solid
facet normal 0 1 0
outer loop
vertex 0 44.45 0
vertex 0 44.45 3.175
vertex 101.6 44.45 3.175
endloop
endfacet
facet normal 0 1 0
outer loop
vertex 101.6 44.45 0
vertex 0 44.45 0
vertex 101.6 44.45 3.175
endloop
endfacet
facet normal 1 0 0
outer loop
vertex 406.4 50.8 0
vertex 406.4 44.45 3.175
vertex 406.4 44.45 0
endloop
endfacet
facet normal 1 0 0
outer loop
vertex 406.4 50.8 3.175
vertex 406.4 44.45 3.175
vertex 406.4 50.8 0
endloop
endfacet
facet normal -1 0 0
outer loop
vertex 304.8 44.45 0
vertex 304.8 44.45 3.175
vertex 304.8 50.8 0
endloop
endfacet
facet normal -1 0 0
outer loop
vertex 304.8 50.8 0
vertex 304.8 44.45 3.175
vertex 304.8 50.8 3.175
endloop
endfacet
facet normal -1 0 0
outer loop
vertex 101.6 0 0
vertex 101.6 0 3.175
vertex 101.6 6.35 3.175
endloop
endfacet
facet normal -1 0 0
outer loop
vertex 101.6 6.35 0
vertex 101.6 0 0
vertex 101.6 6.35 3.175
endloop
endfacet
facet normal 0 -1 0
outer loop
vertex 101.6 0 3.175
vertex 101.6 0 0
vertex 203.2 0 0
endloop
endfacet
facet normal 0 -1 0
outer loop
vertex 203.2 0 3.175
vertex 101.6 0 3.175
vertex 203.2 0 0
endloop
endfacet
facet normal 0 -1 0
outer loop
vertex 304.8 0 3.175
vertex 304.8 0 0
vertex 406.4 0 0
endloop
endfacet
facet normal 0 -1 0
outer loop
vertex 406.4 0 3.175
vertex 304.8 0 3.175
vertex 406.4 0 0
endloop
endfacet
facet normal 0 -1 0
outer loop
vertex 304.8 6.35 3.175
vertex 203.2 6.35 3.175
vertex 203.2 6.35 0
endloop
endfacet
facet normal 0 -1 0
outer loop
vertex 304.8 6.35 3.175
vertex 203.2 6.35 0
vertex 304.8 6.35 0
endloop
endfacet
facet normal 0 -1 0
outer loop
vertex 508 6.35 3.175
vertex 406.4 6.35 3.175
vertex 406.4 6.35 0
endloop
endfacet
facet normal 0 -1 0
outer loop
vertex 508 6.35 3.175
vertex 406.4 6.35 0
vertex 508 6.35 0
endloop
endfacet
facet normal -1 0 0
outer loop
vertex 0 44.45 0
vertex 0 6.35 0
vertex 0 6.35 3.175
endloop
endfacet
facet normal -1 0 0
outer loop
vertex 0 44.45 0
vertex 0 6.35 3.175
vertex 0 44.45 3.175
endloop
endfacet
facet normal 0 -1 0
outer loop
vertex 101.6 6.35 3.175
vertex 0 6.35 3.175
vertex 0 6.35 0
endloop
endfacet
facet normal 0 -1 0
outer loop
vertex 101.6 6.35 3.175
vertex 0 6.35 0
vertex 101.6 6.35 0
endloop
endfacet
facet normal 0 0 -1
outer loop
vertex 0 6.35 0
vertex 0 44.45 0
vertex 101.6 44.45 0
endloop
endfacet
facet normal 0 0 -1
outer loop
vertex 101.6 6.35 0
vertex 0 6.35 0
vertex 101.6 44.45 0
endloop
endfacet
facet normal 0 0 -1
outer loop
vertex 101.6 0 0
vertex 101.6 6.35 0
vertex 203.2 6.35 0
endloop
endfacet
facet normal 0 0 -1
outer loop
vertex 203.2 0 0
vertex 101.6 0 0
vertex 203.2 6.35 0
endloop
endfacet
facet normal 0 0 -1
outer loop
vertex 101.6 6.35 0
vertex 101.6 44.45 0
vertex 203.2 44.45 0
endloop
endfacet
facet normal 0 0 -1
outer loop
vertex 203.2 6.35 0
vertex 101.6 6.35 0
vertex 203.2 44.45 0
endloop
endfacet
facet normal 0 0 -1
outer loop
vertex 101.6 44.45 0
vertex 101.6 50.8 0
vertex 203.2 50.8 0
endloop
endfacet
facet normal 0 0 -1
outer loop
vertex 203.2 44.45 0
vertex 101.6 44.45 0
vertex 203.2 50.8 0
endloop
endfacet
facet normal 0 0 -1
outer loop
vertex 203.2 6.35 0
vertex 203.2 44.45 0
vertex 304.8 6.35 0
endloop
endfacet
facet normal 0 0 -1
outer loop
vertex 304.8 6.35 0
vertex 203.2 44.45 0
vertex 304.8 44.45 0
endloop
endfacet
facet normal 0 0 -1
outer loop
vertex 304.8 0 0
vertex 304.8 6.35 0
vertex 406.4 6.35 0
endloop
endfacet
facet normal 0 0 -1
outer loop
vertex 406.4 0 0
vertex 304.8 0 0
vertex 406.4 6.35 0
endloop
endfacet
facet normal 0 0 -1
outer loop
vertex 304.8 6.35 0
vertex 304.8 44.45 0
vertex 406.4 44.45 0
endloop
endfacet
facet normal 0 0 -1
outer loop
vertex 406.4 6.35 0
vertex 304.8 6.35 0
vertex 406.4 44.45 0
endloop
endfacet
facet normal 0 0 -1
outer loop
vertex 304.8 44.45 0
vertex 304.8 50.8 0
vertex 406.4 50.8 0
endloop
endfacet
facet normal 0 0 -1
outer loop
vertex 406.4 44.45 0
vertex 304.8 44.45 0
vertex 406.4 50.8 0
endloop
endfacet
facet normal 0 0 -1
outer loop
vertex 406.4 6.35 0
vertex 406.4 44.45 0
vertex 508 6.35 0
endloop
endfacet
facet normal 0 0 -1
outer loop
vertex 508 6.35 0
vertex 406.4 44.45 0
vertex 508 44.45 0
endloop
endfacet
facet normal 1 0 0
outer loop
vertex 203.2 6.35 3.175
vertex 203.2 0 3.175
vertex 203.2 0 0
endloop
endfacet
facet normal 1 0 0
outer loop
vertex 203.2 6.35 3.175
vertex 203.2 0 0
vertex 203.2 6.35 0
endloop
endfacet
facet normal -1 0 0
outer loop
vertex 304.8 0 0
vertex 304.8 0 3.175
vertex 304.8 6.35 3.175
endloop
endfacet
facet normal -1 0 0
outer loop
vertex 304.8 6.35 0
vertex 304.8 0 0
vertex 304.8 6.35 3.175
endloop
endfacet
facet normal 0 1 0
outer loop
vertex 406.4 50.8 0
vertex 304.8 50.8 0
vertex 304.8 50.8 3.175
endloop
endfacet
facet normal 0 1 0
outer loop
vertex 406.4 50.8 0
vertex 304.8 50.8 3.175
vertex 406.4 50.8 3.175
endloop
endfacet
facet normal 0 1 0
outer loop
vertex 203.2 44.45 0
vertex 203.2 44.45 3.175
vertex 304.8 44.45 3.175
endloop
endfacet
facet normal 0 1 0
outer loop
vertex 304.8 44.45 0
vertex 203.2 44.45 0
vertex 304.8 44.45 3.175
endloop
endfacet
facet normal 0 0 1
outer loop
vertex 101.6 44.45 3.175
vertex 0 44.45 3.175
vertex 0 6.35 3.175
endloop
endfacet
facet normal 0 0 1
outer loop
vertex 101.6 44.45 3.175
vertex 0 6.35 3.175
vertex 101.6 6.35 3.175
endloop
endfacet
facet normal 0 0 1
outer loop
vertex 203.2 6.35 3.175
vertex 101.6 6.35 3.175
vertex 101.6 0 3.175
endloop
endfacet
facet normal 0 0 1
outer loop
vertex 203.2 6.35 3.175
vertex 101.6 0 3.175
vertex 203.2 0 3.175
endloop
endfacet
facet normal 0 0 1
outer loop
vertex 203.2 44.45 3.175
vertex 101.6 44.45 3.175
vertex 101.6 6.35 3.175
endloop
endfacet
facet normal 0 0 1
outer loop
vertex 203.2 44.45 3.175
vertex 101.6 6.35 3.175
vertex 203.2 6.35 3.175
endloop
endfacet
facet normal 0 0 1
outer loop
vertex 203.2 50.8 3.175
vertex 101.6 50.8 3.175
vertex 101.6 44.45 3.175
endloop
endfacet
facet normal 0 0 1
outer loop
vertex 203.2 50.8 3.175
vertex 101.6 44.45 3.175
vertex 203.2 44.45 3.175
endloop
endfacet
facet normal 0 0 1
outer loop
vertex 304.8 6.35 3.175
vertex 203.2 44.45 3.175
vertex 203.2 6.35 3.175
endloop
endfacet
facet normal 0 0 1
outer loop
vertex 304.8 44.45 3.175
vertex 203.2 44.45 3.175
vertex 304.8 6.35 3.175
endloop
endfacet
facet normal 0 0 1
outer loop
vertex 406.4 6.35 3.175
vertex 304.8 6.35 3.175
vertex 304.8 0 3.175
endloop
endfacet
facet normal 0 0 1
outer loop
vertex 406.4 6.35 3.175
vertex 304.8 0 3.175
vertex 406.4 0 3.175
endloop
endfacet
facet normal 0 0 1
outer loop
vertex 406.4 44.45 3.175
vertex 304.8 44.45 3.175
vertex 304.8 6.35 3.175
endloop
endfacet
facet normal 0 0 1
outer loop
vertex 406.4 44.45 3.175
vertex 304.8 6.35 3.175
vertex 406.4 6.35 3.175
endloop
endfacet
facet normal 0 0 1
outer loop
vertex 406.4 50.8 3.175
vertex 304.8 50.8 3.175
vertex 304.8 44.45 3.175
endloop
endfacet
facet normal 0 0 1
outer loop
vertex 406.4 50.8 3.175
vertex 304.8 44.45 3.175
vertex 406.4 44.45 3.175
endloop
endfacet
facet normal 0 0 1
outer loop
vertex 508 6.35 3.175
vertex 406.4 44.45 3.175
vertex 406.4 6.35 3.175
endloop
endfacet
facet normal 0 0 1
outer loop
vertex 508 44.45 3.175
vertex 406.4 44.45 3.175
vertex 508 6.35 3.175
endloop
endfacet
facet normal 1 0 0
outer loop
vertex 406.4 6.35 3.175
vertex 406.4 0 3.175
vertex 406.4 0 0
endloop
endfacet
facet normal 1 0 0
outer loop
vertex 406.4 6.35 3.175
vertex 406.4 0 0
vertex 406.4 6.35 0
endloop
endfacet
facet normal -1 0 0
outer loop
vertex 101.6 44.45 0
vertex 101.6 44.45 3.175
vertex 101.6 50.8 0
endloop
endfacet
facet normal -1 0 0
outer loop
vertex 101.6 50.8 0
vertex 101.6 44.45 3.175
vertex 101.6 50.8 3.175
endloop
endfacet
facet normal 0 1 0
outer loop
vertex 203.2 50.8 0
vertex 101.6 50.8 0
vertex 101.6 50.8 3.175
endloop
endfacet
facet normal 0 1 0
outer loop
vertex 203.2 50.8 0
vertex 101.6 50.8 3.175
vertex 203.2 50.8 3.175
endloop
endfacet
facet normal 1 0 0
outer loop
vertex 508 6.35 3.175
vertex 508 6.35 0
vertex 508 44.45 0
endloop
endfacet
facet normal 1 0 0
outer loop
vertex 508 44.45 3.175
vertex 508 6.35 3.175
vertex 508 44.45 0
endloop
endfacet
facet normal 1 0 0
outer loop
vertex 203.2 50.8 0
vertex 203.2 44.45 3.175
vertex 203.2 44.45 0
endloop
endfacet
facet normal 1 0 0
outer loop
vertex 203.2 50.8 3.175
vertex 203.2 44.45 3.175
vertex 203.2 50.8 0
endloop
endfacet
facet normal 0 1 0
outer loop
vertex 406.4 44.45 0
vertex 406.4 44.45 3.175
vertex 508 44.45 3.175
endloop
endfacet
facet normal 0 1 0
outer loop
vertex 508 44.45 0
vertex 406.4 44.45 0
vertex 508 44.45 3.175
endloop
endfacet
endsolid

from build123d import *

# Parameters (mm, degrees)
F0_W     = 508
F0_H     = 50.8
F1_DEPTH = 3.175
F2_W     = 101.6
F2_H     = 6.35
F3_DEPTH = 25.4
F4_W     = 101.6
F4_H     = 6.35
F5_DEPTH = 25.4


with BuildPart() as f1:
    # F0 (on Top) → F1 (new body)
    with BuildSketch(Plane.XY):
        with Locations((254, 25.4)):
            Rectangle(F0_W, F0_H)
    extrude(amount=F1_DEPTH)

    # F2 (on face) → F3 (cut)
    with BuildSketch(Plane.XY.offset(3.175)):
        with Locations((254, 3.175)):
            Rectangle(F2_W, F2_H)
        with Locations((457.2, 3.175)):
            Rectangle(F2_W, F2_H)
        with Locations((50.8, 3.175)):
            Rectangle(F2_W, F2_H)
    extrude(amount=-F3_DEPTH, mode=Mode.SUBTRACT)

    # F4 (on face) → F5 (cut)
    with BuildSketch(Plane.XY.offset(3.175)):
        with Locations((457.2, 47.625)):
            Rectangle(F4_W, F4_H)
        with Locations((254, 47.625)):
            Rectangle(F4_W, F4_H)
        with Locations((50.8, 47.625)):
            Rectangle(F4_W, F4_H)
    extrude(amount=-F5_DEPTH, mode=Mode.SUBTRACT)


solid = f1.part
